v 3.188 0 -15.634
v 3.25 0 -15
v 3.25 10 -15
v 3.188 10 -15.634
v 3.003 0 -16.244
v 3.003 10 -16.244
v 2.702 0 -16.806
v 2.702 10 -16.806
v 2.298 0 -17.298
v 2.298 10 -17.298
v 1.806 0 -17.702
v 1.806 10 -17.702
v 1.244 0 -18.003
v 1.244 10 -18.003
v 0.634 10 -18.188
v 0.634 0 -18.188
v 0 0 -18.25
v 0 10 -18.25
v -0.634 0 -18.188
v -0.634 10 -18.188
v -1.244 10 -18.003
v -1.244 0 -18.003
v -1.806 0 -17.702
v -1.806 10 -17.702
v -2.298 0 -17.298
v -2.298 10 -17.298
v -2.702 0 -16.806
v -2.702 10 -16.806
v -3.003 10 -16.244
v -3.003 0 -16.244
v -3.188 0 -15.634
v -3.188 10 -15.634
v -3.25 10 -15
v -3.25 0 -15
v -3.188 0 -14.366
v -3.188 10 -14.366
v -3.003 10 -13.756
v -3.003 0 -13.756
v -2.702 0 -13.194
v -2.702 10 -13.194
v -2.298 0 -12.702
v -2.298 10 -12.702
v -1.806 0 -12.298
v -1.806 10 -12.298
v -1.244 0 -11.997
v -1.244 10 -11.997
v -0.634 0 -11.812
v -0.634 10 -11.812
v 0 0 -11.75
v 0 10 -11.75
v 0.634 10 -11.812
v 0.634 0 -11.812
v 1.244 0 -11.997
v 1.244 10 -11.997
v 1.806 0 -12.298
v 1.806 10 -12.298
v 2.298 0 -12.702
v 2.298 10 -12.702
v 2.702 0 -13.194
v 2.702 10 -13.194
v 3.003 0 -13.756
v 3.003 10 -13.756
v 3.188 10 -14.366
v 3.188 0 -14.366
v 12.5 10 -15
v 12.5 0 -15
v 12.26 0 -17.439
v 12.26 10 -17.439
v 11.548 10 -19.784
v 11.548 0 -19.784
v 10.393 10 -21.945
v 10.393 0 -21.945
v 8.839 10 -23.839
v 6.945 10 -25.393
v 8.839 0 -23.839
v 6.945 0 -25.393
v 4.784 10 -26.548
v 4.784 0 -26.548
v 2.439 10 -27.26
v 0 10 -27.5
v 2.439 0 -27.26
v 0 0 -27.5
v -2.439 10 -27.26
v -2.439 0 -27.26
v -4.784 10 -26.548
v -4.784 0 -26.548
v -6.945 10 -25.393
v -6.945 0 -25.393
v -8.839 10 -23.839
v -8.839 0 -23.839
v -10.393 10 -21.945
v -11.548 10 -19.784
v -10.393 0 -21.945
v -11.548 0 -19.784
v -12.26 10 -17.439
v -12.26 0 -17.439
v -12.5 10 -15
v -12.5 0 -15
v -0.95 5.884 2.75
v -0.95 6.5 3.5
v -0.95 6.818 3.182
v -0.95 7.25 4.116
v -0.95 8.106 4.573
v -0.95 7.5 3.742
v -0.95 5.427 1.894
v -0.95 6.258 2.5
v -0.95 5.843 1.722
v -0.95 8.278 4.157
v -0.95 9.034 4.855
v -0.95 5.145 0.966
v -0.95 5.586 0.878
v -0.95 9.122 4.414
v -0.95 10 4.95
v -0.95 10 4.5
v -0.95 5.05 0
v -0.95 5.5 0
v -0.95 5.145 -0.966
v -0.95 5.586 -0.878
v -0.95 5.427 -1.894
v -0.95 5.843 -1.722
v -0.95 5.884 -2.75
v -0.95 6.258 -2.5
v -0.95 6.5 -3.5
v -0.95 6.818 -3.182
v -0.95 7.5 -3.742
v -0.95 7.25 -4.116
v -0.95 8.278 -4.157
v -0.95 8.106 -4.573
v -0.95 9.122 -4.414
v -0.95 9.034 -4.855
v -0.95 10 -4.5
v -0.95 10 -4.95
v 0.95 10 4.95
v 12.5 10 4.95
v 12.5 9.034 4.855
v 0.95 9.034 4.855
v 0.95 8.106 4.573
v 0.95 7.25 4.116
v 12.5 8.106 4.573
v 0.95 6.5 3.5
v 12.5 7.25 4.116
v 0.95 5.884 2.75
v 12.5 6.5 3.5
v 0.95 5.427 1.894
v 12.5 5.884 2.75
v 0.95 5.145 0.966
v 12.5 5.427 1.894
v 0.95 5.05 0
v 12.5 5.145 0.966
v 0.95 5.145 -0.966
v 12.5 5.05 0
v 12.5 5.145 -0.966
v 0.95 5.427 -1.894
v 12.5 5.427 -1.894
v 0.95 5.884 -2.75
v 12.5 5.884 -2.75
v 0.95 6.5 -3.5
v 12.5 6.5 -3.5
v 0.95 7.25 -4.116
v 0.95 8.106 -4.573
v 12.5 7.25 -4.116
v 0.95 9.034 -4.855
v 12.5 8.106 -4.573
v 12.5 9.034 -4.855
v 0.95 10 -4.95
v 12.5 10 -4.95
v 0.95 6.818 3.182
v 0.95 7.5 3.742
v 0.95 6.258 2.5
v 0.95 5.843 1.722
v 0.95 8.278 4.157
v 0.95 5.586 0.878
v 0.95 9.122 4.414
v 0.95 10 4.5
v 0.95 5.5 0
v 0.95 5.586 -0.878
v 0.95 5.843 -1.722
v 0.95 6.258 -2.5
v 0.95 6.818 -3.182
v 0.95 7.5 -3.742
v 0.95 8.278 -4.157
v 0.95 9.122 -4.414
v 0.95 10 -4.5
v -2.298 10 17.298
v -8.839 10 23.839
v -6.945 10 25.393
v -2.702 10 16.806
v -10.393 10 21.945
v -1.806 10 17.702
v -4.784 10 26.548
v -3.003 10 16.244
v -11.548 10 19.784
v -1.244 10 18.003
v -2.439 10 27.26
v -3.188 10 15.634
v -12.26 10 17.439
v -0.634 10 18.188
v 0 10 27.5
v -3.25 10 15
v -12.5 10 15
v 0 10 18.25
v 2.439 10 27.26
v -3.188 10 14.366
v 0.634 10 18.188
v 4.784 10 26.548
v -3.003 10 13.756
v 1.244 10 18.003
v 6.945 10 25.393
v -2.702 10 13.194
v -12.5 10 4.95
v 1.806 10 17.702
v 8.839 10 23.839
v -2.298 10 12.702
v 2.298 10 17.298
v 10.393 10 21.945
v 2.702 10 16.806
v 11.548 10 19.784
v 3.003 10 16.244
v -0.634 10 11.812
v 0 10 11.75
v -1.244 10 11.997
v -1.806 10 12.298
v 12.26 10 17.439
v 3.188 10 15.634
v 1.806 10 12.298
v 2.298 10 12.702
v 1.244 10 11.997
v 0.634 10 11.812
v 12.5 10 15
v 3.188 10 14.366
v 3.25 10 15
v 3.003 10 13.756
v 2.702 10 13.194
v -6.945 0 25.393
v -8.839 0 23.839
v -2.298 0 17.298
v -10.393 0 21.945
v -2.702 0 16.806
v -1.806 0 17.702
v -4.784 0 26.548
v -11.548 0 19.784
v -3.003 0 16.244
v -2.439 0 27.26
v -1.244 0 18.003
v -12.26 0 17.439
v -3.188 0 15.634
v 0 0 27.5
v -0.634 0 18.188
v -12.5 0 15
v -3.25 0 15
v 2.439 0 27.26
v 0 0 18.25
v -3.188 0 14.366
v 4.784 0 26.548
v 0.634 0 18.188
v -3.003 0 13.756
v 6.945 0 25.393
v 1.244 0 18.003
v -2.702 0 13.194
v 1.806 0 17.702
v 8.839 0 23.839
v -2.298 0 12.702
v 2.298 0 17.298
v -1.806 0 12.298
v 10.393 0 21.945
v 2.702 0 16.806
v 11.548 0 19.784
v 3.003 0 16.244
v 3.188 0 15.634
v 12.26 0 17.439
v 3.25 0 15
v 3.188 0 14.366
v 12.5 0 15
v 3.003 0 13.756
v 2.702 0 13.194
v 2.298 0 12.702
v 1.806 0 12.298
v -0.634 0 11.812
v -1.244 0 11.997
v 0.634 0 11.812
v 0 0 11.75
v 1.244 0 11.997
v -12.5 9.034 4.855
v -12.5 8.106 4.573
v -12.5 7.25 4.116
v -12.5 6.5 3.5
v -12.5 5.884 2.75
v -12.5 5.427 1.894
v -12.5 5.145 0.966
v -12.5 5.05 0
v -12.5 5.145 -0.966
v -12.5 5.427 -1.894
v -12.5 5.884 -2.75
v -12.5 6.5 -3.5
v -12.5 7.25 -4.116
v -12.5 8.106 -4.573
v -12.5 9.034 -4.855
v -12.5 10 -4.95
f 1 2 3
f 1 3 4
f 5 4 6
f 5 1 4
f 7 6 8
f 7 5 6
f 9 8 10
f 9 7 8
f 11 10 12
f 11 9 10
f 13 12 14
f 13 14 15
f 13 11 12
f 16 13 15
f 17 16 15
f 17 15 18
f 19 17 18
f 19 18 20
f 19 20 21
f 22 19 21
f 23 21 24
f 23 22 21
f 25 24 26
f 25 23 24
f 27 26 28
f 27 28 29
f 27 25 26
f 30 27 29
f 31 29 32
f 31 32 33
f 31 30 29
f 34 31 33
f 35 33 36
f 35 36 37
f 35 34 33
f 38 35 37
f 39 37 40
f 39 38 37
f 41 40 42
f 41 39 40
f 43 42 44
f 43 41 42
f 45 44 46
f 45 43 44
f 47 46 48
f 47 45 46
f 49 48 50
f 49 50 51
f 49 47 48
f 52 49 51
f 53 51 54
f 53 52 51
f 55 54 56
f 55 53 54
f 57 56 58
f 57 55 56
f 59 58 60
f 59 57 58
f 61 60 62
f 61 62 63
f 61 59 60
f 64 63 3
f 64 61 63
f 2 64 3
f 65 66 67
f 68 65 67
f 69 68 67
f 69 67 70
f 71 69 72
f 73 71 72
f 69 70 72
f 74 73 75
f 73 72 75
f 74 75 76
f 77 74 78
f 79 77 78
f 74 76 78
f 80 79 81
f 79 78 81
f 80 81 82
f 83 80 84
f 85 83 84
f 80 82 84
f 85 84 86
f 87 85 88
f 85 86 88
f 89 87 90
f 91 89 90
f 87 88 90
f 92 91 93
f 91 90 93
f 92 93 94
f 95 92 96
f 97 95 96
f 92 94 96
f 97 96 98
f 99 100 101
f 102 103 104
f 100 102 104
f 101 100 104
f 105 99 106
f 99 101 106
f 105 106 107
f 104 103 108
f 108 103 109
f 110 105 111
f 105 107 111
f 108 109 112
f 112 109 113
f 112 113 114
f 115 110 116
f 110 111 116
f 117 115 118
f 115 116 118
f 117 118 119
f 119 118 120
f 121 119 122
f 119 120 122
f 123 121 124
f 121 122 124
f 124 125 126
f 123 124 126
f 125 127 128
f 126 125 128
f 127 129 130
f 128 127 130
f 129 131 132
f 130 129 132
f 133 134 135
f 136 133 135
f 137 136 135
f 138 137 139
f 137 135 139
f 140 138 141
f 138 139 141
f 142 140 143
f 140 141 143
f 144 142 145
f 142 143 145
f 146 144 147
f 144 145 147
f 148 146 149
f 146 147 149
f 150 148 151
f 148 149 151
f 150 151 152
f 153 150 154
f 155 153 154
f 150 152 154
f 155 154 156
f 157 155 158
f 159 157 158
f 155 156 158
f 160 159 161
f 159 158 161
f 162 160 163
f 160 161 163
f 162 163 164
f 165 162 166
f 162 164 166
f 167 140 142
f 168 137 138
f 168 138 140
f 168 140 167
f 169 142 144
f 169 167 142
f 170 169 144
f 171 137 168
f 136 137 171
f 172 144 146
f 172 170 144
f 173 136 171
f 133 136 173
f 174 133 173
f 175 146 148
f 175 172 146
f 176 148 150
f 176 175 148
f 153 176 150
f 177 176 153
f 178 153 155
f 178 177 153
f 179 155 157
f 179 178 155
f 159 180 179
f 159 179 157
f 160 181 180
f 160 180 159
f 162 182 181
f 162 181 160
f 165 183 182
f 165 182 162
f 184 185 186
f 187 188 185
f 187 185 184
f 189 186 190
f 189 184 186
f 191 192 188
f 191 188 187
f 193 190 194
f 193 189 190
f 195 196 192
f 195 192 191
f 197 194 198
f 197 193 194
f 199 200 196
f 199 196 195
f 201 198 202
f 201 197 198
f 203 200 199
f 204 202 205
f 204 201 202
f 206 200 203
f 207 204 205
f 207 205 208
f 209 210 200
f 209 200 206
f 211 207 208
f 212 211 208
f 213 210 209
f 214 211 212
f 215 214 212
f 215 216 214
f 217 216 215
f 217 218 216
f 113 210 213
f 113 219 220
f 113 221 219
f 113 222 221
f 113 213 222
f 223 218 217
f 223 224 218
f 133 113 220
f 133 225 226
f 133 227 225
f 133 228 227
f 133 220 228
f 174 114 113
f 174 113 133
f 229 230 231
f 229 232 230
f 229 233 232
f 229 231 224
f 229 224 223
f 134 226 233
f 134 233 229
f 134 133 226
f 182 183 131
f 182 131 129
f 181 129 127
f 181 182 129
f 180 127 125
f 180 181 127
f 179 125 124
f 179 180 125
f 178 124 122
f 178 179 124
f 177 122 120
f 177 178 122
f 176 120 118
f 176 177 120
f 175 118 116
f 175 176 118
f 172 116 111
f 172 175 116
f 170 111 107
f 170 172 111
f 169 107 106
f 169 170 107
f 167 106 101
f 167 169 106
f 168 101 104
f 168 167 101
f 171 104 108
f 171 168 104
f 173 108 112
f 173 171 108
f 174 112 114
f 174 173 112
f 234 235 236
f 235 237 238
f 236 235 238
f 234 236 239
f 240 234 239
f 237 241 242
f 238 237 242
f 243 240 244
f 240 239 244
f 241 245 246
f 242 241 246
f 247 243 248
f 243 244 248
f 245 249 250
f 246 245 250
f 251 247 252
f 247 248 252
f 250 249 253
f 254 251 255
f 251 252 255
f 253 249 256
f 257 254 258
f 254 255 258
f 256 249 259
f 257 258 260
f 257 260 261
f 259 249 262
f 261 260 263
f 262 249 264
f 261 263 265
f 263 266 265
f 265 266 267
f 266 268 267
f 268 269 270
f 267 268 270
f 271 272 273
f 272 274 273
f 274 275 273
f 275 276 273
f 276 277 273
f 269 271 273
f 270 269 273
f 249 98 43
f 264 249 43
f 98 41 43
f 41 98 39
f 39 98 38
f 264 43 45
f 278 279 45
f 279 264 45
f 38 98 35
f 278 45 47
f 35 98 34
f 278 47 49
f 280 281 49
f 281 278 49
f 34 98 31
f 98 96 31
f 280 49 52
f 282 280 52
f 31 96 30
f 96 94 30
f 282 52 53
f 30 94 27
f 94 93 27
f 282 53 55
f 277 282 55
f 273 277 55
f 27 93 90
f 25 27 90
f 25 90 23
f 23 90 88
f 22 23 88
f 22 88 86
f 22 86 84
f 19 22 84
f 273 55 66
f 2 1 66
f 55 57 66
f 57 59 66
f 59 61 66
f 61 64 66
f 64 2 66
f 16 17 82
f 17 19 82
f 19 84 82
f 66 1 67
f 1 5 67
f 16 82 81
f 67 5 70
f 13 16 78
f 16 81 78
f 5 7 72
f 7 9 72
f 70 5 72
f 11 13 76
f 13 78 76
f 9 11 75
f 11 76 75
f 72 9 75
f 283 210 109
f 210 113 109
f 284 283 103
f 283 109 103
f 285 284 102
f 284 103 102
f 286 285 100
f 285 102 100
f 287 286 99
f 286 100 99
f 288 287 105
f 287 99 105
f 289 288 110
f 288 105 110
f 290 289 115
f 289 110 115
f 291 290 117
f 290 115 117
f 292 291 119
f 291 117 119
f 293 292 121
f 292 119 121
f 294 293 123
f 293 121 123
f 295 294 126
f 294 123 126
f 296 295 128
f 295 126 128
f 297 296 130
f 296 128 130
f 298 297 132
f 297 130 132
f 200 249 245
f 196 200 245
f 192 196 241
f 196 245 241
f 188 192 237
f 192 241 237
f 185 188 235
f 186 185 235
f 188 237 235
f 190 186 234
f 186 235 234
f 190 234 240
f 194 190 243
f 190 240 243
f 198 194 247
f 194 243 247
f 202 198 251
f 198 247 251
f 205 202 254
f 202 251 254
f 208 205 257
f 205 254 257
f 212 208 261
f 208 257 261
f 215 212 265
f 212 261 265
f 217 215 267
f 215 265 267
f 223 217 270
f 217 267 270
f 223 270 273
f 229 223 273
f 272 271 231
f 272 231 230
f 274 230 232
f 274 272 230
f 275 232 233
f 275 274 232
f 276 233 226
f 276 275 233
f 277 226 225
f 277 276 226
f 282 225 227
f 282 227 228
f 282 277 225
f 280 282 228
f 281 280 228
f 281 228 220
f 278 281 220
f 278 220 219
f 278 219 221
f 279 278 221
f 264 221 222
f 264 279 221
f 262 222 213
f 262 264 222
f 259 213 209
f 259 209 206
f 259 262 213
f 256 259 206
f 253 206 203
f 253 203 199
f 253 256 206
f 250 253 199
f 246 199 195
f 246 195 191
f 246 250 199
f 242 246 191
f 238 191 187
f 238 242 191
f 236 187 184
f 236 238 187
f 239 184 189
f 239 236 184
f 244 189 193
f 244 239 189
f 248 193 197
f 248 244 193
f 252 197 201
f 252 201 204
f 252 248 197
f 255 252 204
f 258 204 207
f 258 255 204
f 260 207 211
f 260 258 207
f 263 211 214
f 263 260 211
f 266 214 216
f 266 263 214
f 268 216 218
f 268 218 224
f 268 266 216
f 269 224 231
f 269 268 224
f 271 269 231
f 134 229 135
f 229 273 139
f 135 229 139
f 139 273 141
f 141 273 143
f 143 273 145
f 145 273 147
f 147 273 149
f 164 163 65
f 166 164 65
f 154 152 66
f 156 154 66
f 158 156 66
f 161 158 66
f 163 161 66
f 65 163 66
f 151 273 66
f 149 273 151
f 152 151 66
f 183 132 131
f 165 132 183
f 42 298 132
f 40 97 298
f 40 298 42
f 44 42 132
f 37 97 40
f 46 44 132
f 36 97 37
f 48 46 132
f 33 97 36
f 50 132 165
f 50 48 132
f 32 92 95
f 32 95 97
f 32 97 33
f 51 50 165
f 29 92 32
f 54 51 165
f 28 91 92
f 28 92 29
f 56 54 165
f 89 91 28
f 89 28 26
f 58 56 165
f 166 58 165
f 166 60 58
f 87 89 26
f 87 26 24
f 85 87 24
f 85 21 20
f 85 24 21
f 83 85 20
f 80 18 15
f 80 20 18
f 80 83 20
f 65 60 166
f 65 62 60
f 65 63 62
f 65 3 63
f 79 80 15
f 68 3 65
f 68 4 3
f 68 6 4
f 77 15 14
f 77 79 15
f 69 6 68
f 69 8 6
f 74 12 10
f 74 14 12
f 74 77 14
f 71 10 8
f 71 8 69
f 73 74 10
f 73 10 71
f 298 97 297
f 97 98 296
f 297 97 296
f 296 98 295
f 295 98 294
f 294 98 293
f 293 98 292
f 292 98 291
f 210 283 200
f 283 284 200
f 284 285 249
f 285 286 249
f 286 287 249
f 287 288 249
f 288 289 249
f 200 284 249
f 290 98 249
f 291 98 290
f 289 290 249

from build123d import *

# Parameters (mm, degrees)
SKETCH1_R           = 12.5
SKETCH1_R_2         = 3.25
BOSS_EXTRUDE1_DEPTH = 10
CUT_EXTRUDE1_REACH  = 27
SKETCH2_R           = 4.95
BOSS_EXTRUDE2_DEPTH = 0.95


with BuildPart() as part:
    # Sketch1 → Boss-Extrude1 (new body)
    with BuildSketch(Plane(origin=(0, 0, 0), x_dir=(1, 0, 0), z_dir=(0, 1, 0))):
        with BuildLine():
            ThreePointArc((12.5, 15), (0, 2.5), (-12.5, 15))
            Line((-12.5, 15), (-12.5, -14.999999966))
            ThreePointArc((-12.5, -14.999999966), (1.7e-08, -2.5), (12.5, -15))
            Line((12.5, -15), (12.5, 15))
        make_face()
        with Locations((0, 15)):
            Circle(SKETCH1_R)
        with Locations((0, 15)):
            Circle(SKETCH1_R_2, mode=Mode.SUBTRACT)
        with Locations((0, -15)):
            Circle(SKETCH1_R)
        with Locations((0, -15)):
            Circle(SKETCH1_R_2, mode=Mode.SUBTRACT)
    extrude(amount=BOSS_EXTRUDE1_DEPTH)

    # Sketch2 → Cut-Extrude1 (cut, up to next)
    with BuildSketch(Plane(origin=(12.5, 0, 0), x_dir=(0, 0, -1), z_dir=(1, 0, 0)), mode=Mode.PRIVATE) as cut_extrude1_sk1:
        with Locations((0, 10)):
            Circle(SKETCH2_R)
    cut_extrude1_tool1 = extrude(cut_extrude1_sk1.sketch, amount=-CUT_EXTRUDE1_REACH, mode=Mode.PRIVATE) & part.part
    add(cut_extrude1_tool1.solids().sort_by_distance((12.5, 10, 0))[0], mode=Mode.SUBTRACT)

    # Sketch3 → Boss-Extrude2 (add, symmetric)
    with BuildSketch(Plane(origin=(0, 0, 0), x_dir=(0, 0, -1), z_dir=(1, 0, 0))):
        with BuildLine():
            Line((4.95, 10), (4.5, 10))
            ThreePointArc((4.5, 10), (0, 5.5), (-4.5, 10))
            Line((-4.5, 10), (-4.95, 10))
            ThreePointArc((-4.95, 10), (0, 5.05), (4.95, 10))
        make_face()
    extrude(amount=BOSS_EXTRUDE2_DEPTH, both=True)


solid = part.part
